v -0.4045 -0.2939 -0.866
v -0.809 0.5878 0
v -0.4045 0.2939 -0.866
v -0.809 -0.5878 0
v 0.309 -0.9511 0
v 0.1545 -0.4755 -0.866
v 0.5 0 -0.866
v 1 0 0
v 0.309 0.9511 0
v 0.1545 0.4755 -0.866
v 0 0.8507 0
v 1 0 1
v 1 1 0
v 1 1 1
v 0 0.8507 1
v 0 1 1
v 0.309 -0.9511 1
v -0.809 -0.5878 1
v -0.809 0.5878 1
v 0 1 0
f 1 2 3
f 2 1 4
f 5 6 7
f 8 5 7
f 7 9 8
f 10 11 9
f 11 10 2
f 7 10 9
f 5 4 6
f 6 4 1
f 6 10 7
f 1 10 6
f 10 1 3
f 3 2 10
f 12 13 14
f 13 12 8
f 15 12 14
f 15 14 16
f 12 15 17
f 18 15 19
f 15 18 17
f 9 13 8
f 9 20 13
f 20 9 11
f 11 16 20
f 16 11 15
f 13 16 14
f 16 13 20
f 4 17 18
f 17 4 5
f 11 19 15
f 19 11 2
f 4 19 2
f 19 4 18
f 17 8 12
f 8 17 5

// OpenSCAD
minkowski();
hull();
resize();
children();
echo();
for();
intersection_for();
if(false) { cube(); } else { sphere(); }
union();
difference();
intersection();
linear_extrude();
rotate_extrude();
import();
group();
cube();
sphere();
cylinder();
polyhedron();
square();
circle();
polygon();
projection();
render();
surface();
scale();
rotate();
mirror();
translate();
multmatrix();
color();
offset();
text();
